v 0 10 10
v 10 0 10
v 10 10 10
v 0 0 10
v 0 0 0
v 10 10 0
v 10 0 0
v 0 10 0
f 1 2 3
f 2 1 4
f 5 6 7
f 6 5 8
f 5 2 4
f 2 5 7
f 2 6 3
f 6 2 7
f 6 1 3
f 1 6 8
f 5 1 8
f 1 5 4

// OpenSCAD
/* single-object-cube.scad
Author: andimoto@posteo.de
----------------------------
 */

cube([10,10,10]);
